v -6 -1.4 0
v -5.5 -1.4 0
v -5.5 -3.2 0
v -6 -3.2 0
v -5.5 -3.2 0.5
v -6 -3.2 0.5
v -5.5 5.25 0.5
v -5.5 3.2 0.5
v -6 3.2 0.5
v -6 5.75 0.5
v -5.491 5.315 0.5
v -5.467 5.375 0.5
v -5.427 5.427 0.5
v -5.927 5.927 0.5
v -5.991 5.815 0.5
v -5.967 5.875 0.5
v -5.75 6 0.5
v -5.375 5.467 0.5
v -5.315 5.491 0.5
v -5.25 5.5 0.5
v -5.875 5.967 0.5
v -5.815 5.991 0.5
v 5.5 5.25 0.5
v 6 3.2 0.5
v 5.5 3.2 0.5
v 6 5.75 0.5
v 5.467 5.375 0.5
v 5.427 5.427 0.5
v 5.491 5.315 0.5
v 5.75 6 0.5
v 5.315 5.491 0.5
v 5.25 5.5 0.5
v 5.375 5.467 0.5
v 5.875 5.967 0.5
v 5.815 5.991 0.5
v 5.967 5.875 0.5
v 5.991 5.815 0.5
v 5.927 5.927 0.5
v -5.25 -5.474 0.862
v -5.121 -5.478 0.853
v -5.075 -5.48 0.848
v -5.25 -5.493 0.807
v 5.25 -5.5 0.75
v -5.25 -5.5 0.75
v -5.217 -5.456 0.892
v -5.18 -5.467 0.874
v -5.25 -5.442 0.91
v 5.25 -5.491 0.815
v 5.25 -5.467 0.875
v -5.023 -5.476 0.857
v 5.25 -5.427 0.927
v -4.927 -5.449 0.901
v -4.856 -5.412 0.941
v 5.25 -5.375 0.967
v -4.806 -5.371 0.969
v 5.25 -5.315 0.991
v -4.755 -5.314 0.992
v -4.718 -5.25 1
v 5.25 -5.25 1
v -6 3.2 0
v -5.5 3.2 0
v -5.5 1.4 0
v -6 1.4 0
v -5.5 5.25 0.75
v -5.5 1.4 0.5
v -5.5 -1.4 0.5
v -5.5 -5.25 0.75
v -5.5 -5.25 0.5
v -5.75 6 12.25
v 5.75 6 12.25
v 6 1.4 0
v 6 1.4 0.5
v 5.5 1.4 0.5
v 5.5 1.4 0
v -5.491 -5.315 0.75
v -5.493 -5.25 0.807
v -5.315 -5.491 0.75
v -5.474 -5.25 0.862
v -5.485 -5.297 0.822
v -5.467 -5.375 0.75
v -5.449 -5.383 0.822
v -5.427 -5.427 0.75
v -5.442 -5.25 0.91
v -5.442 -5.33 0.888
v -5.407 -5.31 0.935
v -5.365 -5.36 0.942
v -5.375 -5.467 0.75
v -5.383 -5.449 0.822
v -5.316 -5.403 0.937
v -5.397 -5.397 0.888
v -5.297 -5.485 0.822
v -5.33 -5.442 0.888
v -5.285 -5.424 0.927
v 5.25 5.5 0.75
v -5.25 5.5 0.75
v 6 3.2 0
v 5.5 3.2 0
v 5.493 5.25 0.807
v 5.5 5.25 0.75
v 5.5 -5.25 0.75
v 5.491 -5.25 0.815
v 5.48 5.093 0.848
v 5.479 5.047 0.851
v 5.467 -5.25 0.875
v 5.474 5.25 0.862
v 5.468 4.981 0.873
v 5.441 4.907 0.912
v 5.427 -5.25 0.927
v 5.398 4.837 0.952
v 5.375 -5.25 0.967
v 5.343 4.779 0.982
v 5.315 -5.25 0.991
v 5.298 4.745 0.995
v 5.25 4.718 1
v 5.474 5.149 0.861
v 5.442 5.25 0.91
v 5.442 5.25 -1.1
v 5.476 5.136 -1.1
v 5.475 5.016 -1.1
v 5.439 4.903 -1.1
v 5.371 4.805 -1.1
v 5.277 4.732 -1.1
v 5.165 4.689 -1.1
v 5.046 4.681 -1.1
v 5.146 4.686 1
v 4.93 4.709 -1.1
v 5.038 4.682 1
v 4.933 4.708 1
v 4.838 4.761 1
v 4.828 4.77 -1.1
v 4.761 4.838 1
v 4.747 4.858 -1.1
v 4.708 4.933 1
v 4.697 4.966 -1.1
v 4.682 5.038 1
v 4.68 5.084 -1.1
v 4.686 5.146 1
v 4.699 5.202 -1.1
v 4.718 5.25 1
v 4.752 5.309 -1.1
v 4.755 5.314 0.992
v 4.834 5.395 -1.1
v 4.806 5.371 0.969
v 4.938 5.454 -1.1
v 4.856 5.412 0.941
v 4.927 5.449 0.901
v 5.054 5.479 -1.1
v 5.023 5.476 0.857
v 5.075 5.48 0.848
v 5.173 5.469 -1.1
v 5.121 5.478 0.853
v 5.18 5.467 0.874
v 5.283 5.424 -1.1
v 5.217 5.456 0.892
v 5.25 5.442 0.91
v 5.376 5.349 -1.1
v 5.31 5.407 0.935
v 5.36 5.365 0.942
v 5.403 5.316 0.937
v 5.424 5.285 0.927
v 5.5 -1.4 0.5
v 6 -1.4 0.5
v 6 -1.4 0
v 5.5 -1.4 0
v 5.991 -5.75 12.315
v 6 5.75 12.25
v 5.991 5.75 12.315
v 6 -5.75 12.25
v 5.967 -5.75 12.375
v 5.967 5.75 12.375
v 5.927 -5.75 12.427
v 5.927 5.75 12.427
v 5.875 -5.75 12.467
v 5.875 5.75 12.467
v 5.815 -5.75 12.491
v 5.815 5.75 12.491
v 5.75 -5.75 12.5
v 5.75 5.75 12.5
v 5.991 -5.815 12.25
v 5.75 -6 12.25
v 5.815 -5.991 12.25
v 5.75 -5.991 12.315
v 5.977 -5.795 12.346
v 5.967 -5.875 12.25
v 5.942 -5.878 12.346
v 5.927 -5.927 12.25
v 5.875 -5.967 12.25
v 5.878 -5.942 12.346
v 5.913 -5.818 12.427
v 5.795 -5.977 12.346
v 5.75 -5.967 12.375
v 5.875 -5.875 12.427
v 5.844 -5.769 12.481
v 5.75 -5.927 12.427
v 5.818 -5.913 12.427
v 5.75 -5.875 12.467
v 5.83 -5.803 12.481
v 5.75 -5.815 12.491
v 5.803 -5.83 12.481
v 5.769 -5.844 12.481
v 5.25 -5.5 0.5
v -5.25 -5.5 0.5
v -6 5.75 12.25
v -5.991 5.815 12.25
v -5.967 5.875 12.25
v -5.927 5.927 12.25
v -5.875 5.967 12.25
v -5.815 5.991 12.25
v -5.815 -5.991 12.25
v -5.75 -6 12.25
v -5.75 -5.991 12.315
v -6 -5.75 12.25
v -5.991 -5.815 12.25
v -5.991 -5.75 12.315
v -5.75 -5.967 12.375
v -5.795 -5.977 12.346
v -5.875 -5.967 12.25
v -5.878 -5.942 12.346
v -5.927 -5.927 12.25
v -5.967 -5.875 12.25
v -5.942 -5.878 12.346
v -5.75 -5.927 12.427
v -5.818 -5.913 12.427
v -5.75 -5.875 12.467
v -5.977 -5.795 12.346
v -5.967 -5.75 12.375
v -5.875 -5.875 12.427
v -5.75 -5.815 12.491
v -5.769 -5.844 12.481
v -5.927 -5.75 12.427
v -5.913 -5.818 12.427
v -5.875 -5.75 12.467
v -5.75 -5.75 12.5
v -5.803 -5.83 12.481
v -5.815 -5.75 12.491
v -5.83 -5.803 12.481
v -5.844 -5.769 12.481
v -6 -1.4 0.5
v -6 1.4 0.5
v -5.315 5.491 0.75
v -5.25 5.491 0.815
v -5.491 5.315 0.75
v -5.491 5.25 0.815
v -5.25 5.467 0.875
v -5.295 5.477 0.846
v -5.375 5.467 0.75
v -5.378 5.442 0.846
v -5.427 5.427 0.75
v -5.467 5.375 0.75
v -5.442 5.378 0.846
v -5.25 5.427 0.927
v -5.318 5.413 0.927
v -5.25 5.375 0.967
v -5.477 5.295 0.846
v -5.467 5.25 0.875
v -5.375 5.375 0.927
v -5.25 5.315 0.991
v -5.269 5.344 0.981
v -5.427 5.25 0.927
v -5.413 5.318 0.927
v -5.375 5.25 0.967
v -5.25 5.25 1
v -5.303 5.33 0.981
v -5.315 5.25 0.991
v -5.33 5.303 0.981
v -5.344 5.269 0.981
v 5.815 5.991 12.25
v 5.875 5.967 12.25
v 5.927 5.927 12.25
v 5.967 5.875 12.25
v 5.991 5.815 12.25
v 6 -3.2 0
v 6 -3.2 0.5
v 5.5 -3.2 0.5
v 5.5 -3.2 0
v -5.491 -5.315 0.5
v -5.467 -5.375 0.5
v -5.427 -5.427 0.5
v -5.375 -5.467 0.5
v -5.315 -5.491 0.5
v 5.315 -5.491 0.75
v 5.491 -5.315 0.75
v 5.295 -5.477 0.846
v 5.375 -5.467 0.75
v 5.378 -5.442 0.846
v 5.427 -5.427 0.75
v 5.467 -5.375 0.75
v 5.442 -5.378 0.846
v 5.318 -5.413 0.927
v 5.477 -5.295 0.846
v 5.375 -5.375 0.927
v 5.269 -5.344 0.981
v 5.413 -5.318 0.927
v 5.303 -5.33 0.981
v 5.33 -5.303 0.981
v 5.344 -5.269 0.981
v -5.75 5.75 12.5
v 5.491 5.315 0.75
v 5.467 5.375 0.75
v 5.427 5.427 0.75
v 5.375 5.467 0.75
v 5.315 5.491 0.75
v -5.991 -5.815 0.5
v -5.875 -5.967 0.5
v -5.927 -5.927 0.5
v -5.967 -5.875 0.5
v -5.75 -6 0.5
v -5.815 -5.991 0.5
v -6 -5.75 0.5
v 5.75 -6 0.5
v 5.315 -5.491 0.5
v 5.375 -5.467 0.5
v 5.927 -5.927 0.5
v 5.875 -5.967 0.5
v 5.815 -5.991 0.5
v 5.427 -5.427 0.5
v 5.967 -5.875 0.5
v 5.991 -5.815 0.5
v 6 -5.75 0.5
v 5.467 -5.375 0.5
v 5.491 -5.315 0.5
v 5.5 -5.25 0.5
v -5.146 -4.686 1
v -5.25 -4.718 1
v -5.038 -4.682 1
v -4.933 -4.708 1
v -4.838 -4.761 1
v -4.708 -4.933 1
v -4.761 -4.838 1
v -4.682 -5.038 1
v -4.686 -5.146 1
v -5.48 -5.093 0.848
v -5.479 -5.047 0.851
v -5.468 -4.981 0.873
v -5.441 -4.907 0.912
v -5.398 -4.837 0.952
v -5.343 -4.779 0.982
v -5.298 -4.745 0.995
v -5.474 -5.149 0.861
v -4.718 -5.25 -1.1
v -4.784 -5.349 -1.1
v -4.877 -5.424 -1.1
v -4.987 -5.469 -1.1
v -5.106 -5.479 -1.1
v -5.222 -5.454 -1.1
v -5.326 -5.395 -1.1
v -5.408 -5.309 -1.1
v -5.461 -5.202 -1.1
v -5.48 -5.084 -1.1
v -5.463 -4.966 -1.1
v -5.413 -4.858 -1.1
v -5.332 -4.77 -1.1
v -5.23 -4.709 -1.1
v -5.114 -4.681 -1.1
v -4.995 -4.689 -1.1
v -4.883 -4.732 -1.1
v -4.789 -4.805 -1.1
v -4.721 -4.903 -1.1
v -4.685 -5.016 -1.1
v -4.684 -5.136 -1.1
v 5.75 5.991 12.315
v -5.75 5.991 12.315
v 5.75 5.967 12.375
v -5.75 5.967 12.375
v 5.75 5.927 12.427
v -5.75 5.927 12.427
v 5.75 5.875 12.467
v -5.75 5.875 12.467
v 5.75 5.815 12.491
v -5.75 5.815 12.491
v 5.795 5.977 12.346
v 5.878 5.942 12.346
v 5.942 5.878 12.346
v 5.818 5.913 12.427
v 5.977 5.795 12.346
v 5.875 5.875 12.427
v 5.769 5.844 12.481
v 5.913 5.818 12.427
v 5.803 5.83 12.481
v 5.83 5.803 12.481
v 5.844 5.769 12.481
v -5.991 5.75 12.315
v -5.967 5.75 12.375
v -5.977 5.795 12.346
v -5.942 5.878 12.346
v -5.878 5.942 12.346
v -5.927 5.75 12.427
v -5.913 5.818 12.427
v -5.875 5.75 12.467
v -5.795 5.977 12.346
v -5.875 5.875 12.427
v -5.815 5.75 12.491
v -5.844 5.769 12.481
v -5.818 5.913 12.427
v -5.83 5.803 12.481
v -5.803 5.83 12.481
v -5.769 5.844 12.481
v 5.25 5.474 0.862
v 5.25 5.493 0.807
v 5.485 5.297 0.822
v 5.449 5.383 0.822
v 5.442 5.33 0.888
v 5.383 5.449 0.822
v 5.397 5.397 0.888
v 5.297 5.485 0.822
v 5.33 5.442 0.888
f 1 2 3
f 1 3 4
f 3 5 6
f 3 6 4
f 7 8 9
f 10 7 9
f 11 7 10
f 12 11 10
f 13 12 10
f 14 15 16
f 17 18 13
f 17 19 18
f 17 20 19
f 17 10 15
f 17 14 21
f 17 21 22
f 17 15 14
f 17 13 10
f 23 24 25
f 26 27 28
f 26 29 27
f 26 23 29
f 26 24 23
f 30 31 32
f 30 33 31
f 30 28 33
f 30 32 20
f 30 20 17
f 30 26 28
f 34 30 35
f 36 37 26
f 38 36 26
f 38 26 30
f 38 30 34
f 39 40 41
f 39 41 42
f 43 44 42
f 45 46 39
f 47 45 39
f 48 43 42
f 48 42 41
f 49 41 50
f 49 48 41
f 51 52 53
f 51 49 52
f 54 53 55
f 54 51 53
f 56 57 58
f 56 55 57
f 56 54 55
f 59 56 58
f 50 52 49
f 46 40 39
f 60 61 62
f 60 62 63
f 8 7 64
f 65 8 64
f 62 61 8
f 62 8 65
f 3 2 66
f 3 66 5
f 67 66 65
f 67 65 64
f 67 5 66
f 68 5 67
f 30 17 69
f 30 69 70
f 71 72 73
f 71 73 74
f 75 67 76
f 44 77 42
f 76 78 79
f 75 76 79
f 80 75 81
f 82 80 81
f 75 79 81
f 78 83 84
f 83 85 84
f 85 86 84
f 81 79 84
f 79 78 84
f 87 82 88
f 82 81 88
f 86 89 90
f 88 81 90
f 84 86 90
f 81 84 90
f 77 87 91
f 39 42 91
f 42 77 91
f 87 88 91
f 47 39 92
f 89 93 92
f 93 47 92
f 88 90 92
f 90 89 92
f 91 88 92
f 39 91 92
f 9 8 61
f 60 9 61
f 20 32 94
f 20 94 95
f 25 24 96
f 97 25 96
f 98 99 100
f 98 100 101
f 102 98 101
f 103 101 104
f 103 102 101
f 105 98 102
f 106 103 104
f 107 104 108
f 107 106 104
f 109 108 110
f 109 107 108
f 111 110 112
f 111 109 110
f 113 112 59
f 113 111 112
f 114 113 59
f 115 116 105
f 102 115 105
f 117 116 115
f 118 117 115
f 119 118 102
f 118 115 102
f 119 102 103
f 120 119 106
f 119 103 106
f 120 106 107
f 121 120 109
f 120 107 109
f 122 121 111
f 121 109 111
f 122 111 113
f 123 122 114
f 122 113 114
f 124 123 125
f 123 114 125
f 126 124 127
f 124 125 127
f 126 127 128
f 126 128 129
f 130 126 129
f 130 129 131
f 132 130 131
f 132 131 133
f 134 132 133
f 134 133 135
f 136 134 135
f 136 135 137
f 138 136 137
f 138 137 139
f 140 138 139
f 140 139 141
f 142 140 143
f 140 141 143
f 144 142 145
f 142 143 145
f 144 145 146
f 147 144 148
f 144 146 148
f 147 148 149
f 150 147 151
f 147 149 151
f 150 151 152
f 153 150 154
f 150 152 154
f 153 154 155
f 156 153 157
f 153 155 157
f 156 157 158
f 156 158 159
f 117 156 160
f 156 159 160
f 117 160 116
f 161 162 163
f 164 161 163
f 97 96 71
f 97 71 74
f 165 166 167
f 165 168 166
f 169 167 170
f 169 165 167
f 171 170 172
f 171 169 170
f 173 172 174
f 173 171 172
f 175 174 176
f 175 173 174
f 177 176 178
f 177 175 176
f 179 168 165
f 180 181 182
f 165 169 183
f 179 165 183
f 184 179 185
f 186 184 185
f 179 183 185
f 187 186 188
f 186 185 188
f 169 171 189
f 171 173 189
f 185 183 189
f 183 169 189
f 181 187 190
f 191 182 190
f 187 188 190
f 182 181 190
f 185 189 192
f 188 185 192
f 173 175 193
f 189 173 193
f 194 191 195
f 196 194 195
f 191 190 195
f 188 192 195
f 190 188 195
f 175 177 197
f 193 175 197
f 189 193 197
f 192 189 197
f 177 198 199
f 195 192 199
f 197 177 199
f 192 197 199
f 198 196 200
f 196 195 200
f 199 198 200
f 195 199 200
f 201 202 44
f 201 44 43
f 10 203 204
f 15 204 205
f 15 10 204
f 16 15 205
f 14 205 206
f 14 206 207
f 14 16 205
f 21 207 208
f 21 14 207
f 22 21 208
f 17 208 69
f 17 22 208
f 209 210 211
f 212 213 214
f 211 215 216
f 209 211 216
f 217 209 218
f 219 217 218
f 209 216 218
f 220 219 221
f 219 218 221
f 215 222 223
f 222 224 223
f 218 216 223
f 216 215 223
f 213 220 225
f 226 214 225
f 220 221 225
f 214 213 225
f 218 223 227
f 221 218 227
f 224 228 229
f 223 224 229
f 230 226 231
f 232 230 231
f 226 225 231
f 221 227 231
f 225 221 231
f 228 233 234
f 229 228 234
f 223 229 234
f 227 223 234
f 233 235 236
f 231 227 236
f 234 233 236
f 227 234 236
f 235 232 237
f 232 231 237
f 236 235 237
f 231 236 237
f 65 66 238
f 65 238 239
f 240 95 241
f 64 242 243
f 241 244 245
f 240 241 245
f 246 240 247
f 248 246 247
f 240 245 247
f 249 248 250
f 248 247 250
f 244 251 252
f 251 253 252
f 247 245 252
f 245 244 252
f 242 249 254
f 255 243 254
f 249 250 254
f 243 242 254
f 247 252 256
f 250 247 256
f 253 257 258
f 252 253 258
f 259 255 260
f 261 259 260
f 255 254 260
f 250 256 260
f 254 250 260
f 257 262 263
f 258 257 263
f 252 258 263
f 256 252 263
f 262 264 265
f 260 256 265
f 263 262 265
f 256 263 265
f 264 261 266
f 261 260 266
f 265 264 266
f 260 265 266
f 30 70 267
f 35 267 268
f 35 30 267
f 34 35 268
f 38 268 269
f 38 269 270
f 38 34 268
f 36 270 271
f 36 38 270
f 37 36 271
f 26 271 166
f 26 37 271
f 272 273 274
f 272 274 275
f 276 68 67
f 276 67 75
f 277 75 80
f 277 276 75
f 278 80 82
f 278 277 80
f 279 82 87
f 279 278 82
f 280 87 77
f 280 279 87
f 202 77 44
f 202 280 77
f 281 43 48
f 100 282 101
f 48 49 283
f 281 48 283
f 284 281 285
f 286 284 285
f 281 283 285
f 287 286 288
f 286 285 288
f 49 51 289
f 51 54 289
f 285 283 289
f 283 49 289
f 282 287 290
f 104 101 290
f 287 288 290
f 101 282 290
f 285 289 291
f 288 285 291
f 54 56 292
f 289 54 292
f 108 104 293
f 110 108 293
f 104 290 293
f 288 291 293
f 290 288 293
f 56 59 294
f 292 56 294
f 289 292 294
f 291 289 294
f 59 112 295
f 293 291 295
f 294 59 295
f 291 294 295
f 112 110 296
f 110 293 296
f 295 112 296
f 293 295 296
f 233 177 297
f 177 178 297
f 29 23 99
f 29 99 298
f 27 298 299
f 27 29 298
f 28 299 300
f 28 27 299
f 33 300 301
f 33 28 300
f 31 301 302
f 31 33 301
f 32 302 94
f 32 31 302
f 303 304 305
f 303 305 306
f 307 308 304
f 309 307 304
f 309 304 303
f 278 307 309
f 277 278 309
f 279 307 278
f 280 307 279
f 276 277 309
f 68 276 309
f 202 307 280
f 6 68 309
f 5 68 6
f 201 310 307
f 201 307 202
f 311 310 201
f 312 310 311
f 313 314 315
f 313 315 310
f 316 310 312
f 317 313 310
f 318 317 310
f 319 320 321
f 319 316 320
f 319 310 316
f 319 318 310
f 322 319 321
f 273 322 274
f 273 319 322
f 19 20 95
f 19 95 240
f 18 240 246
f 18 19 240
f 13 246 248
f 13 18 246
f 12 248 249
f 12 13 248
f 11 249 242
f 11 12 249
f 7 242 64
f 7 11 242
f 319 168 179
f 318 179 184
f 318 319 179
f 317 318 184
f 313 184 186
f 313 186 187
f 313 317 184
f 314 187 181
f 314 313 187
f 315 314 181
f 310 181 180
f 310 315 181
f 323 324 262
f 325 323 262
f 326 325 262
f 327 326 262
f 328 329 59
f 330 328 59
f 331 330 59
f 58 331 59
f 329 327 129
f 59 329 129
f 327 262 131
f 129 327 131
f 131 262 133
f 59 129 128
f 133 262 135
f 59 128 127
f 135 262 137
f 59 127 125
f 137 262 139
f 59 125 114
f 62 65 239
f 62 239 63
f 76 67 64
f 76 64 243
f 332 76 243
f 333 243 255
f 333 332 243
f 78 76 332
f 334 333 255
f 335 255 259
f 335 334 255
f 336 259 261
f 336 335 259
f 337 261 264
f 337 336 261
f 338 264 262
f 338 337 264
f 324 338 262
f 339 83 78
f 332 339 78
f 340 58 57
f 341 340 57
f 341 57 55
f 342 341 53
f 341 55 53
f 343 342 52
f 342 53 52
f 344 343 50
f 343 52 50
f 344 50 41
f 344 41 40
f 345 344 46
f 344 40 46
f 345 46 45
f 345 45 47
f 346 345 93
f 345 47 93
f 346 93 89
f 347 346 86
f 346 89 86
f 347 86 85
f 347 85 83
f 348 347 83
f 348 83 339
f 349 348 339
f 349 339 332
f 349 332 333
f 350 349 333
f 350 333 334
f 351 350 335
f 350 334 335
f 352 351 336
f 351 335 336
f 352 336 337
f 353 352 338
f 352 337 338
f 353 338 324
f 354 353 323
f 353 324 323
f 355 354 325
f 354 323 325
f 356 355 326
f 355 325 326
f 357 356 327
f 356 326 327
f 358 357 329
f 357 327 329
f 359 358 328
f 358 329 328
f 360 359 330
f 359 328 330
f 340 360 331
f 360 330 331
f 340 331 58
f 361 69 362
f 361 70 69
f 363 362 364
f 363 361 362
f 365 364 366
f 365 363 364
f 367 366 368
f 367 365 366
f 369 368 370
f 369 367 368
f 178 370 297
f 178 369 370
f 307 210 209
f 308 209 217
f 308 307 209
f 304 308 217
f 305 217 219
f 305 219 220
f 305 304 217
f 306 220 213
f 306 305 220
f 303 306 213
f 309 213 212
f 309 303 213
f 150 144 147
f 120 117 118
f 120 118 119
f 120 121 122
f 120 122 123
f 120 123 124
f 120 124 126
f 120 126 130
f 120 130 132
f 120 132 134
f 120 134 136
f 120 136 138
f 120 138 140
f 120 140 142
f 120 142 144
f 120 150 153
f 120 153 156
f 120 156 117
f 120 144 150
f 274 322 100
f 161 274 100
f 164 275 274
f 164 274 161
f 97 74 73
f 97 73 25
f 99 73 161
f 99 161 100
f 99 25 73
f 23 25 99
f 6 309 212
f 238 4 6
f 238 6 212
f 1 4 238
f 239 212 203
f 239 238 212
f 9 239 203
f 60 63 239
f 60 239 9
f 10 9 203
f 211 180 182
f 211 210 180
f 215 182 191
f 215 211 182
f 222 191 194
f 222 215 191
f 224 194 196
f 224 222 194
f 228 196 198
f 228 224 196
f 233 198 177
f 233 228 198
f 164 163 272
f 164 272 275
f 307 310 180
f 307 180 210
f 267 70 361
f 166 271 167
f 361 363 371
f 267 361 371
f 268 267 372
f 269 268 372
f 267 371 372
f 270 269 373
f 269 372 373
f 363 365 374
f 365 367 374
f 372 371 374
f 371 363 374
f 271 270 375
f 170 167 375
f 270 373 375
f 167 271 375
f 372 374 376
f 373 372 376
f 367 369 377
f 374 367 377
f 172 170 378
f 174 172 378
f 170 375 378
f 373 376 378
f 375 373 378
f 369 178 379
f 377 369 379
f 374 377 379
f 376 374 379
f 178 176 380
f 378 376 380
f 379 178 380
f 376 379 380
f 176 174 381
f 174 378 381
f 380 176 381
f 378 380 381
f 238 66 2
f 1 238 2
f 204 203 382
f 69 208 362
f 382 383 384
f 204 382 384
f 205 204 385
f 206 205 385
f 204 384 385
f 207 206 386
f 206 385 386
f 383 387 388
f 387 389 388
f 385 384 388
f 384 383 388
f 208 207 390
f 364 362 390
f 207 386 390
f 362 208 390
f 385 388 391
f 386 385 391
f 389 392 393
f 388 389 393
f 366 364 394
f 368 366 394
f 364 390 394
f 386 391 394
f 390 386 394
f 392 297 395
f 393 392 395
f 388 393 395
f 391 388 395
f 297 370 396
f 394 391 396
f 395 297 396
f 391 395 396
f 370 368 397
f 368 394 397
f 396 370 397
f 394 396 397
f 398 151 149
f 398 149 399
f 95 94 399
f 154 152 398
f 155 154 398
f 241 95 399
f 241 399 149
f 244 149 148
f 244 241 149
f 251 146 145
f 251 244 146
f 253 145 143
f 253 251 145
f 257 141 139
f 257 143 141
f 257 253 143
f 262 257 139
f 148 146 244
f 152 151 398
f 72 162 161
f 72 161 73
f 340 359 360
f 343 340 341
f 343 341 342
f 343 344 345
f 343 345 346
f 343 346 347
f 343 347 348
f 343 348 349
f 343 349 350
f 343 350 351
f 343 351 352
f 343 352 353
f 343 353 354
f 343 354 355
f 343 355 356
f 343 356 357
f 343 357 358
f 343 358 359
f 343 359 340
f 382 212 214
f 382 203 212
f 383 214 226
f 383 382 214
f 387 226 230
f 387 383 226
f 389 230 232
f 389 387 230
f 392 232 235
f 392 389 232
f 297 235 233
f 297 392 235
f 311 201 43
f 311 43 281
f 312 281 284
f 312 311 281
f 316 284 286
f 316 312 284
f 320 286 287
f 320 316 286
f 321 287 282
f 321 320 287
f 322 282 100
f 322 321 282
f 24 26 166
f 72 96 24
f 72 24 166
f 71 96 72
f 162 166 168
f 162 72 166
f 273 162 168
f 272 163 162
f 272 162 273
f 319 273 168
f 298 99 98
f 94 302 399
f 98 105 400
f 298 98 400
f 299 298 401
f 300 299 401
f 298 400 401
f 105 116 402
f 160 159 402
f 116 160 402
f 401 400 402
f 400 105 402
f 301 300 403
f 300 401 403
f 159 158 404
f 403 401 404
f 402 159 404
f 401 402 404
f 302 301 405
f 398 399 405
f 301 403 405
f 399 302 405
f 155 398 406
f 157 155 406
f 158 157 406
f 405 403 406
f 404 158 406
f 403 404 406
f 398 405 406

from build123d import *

# Parameters (mm, degrees)
BOSS_EXTRUDE1_DEPTH = 12.5
CUT_EXTRUDE1_DEPTH  = 1
SKETCH3_W           = 0.5
SKETCH3_H           = 2.8
CUT_EXTRUDE2_DEPTH  = 20
FILLET1_R           = 0.25
FILLET2_R           = 0.25
SKETCH4_R           = 0.4
BOSS_EXTRUDE2_DEPTH = 2.1


with BuildPart() as part:
    # Sketch1 → Boss-Extrude1 (new body)
    with BuildSketch(Plane.XY):
        with BuildLine():
            Line((-5.75, 6), (5.75, 6))
            ThreePointArc((5.75, 6), (5.926776695, 5.926776695), (6, 5.75))
            Line((6, 5.75), (6, -5.75))
            ThreePointArc((6, -5.75), (5.926776695, -5.926776695), (5.75, -6))
            Line((5.75, -6), (-5.75, -6))
            ThreePointArc((-5.75, -6), (-5.926776695, -5.926776695), (-6, -5.75))
            Line((-6, -5.75), (-6, 5.75))
            ThreePointArc((-6, 5.75), (-5.926776695, 5.926776695), (-5.75, 6))
        make_face()
    extrude(amount=BOSS_EXTRUDE1_DEPTH)

    # Sketch2 → Cut-Extrude1 (cut)
    with BuildSketch(Plane(origin=(0, 0, 0), x_dir=(-1, 0, 0), z_dir=(0, 0, -1))):
        with BuildLine():
            Line((5.25, -5.5), (-5.25, -5.5))
            ThreePointArc((-5.25, -5.5), (-5.426776695, -5.426776695), (-5.5, -5.25))
            Line((-5.5, -5.25), (-5.5, 5.25))
            ThreePointArc((-5.5, 5.25), (-5.426776695, 5.426776695), (-5.25, 5.5))
            Line((-5.25, 5.5), (5.25, 5.5))
            ThreePointArc((5.25, 5.5), (5.426776695, 5.426776695), (5.5, 5.25))
            Line((5.5, 5.25), (5.5, -5.25))
            ThreePointArc((5.5, -5.25), (5.426776695, -5.426776695), (5.25, -5.5))
        make_face()
    extrude(amount=-CUT_EXTRUDE1_DEPTH, mode=Mode.SUBTRACT)

    # Sketch3 → Cut-Extrude2 (cut)
    with BuildSketch(Plane(origin=(6, 0, 0), x_dir=(0, 0, -1), z_dir=(1, 0, 0))):
        with Locations((-0.25, 0)):
            Rectangle(SKETCH3_W, SKETCH3_H)
        with Locations((-0.25, 4.6)):
            Rectangle(SKETCH3_W, SKETCH3_H)
        with Locations((-0.25, -4.6)):
            Rectangle(SKETCH3_W, SKETCH3_H)
    extrude(amount=-CUT_EXTRUDE2_DEPTH, mode=Mode.SUBTRACT)

    # Fillet1
    fillet1_edges = [part.edges().sort_by_distance(p)[0] for p in [
        (-5.426776695, -5.426776695, 1),
        (0, -5.5, 1),
        (5.426776695, -5.426776695, 1),
        (5.5, 0, 1),
        (5.426776695, 5.426776695, 1),
        (0, 5.5, 1),
        (-5.426776695, 5.426776695, 1),
        (-5.5, 0, 1),
    ]]
    fillet(fillet1_edges, radius=FILLET1_R)

    # Fillet2
    fillet2_edges = [part.edges().sort_by_distance(p)[0] for p in [
        (5.926776695, -5.926776695, 12.5),
        (6, 0, 12.5),
        (5.926776695, 5.926776695, 12.5),
        (0, 6, 12.5),
        (-5.926776695, 5.926776695, 12.5),
        (-6, 0, 12.5),
        (-5.926776695, -5.926776695, 12.5),
        (0, -6, 12.5),
    ]]
    fillet(fillet2_edges, radius=FILLET2_R)

    # Sketch4 → Boss-Extrude2 (add)
    with BuildSketch(Plane(origin=(0, 0, 1), x_dir=(-1, 0, 0), z_dir=(0, 0, -1))):
        with Locations(Location((-5.08, 5.08, 0), (0, 0, 154.849335249))):
            Circle(SKETCH4_R)
        with Locations(Location((5.08, -5.08, 0), (0, 0, 205.150663413))):
            Circle(SKETCH4_R)
    extrude(amount=BOSS_EXTRUDE2_DEPTH)


solid = part.part
